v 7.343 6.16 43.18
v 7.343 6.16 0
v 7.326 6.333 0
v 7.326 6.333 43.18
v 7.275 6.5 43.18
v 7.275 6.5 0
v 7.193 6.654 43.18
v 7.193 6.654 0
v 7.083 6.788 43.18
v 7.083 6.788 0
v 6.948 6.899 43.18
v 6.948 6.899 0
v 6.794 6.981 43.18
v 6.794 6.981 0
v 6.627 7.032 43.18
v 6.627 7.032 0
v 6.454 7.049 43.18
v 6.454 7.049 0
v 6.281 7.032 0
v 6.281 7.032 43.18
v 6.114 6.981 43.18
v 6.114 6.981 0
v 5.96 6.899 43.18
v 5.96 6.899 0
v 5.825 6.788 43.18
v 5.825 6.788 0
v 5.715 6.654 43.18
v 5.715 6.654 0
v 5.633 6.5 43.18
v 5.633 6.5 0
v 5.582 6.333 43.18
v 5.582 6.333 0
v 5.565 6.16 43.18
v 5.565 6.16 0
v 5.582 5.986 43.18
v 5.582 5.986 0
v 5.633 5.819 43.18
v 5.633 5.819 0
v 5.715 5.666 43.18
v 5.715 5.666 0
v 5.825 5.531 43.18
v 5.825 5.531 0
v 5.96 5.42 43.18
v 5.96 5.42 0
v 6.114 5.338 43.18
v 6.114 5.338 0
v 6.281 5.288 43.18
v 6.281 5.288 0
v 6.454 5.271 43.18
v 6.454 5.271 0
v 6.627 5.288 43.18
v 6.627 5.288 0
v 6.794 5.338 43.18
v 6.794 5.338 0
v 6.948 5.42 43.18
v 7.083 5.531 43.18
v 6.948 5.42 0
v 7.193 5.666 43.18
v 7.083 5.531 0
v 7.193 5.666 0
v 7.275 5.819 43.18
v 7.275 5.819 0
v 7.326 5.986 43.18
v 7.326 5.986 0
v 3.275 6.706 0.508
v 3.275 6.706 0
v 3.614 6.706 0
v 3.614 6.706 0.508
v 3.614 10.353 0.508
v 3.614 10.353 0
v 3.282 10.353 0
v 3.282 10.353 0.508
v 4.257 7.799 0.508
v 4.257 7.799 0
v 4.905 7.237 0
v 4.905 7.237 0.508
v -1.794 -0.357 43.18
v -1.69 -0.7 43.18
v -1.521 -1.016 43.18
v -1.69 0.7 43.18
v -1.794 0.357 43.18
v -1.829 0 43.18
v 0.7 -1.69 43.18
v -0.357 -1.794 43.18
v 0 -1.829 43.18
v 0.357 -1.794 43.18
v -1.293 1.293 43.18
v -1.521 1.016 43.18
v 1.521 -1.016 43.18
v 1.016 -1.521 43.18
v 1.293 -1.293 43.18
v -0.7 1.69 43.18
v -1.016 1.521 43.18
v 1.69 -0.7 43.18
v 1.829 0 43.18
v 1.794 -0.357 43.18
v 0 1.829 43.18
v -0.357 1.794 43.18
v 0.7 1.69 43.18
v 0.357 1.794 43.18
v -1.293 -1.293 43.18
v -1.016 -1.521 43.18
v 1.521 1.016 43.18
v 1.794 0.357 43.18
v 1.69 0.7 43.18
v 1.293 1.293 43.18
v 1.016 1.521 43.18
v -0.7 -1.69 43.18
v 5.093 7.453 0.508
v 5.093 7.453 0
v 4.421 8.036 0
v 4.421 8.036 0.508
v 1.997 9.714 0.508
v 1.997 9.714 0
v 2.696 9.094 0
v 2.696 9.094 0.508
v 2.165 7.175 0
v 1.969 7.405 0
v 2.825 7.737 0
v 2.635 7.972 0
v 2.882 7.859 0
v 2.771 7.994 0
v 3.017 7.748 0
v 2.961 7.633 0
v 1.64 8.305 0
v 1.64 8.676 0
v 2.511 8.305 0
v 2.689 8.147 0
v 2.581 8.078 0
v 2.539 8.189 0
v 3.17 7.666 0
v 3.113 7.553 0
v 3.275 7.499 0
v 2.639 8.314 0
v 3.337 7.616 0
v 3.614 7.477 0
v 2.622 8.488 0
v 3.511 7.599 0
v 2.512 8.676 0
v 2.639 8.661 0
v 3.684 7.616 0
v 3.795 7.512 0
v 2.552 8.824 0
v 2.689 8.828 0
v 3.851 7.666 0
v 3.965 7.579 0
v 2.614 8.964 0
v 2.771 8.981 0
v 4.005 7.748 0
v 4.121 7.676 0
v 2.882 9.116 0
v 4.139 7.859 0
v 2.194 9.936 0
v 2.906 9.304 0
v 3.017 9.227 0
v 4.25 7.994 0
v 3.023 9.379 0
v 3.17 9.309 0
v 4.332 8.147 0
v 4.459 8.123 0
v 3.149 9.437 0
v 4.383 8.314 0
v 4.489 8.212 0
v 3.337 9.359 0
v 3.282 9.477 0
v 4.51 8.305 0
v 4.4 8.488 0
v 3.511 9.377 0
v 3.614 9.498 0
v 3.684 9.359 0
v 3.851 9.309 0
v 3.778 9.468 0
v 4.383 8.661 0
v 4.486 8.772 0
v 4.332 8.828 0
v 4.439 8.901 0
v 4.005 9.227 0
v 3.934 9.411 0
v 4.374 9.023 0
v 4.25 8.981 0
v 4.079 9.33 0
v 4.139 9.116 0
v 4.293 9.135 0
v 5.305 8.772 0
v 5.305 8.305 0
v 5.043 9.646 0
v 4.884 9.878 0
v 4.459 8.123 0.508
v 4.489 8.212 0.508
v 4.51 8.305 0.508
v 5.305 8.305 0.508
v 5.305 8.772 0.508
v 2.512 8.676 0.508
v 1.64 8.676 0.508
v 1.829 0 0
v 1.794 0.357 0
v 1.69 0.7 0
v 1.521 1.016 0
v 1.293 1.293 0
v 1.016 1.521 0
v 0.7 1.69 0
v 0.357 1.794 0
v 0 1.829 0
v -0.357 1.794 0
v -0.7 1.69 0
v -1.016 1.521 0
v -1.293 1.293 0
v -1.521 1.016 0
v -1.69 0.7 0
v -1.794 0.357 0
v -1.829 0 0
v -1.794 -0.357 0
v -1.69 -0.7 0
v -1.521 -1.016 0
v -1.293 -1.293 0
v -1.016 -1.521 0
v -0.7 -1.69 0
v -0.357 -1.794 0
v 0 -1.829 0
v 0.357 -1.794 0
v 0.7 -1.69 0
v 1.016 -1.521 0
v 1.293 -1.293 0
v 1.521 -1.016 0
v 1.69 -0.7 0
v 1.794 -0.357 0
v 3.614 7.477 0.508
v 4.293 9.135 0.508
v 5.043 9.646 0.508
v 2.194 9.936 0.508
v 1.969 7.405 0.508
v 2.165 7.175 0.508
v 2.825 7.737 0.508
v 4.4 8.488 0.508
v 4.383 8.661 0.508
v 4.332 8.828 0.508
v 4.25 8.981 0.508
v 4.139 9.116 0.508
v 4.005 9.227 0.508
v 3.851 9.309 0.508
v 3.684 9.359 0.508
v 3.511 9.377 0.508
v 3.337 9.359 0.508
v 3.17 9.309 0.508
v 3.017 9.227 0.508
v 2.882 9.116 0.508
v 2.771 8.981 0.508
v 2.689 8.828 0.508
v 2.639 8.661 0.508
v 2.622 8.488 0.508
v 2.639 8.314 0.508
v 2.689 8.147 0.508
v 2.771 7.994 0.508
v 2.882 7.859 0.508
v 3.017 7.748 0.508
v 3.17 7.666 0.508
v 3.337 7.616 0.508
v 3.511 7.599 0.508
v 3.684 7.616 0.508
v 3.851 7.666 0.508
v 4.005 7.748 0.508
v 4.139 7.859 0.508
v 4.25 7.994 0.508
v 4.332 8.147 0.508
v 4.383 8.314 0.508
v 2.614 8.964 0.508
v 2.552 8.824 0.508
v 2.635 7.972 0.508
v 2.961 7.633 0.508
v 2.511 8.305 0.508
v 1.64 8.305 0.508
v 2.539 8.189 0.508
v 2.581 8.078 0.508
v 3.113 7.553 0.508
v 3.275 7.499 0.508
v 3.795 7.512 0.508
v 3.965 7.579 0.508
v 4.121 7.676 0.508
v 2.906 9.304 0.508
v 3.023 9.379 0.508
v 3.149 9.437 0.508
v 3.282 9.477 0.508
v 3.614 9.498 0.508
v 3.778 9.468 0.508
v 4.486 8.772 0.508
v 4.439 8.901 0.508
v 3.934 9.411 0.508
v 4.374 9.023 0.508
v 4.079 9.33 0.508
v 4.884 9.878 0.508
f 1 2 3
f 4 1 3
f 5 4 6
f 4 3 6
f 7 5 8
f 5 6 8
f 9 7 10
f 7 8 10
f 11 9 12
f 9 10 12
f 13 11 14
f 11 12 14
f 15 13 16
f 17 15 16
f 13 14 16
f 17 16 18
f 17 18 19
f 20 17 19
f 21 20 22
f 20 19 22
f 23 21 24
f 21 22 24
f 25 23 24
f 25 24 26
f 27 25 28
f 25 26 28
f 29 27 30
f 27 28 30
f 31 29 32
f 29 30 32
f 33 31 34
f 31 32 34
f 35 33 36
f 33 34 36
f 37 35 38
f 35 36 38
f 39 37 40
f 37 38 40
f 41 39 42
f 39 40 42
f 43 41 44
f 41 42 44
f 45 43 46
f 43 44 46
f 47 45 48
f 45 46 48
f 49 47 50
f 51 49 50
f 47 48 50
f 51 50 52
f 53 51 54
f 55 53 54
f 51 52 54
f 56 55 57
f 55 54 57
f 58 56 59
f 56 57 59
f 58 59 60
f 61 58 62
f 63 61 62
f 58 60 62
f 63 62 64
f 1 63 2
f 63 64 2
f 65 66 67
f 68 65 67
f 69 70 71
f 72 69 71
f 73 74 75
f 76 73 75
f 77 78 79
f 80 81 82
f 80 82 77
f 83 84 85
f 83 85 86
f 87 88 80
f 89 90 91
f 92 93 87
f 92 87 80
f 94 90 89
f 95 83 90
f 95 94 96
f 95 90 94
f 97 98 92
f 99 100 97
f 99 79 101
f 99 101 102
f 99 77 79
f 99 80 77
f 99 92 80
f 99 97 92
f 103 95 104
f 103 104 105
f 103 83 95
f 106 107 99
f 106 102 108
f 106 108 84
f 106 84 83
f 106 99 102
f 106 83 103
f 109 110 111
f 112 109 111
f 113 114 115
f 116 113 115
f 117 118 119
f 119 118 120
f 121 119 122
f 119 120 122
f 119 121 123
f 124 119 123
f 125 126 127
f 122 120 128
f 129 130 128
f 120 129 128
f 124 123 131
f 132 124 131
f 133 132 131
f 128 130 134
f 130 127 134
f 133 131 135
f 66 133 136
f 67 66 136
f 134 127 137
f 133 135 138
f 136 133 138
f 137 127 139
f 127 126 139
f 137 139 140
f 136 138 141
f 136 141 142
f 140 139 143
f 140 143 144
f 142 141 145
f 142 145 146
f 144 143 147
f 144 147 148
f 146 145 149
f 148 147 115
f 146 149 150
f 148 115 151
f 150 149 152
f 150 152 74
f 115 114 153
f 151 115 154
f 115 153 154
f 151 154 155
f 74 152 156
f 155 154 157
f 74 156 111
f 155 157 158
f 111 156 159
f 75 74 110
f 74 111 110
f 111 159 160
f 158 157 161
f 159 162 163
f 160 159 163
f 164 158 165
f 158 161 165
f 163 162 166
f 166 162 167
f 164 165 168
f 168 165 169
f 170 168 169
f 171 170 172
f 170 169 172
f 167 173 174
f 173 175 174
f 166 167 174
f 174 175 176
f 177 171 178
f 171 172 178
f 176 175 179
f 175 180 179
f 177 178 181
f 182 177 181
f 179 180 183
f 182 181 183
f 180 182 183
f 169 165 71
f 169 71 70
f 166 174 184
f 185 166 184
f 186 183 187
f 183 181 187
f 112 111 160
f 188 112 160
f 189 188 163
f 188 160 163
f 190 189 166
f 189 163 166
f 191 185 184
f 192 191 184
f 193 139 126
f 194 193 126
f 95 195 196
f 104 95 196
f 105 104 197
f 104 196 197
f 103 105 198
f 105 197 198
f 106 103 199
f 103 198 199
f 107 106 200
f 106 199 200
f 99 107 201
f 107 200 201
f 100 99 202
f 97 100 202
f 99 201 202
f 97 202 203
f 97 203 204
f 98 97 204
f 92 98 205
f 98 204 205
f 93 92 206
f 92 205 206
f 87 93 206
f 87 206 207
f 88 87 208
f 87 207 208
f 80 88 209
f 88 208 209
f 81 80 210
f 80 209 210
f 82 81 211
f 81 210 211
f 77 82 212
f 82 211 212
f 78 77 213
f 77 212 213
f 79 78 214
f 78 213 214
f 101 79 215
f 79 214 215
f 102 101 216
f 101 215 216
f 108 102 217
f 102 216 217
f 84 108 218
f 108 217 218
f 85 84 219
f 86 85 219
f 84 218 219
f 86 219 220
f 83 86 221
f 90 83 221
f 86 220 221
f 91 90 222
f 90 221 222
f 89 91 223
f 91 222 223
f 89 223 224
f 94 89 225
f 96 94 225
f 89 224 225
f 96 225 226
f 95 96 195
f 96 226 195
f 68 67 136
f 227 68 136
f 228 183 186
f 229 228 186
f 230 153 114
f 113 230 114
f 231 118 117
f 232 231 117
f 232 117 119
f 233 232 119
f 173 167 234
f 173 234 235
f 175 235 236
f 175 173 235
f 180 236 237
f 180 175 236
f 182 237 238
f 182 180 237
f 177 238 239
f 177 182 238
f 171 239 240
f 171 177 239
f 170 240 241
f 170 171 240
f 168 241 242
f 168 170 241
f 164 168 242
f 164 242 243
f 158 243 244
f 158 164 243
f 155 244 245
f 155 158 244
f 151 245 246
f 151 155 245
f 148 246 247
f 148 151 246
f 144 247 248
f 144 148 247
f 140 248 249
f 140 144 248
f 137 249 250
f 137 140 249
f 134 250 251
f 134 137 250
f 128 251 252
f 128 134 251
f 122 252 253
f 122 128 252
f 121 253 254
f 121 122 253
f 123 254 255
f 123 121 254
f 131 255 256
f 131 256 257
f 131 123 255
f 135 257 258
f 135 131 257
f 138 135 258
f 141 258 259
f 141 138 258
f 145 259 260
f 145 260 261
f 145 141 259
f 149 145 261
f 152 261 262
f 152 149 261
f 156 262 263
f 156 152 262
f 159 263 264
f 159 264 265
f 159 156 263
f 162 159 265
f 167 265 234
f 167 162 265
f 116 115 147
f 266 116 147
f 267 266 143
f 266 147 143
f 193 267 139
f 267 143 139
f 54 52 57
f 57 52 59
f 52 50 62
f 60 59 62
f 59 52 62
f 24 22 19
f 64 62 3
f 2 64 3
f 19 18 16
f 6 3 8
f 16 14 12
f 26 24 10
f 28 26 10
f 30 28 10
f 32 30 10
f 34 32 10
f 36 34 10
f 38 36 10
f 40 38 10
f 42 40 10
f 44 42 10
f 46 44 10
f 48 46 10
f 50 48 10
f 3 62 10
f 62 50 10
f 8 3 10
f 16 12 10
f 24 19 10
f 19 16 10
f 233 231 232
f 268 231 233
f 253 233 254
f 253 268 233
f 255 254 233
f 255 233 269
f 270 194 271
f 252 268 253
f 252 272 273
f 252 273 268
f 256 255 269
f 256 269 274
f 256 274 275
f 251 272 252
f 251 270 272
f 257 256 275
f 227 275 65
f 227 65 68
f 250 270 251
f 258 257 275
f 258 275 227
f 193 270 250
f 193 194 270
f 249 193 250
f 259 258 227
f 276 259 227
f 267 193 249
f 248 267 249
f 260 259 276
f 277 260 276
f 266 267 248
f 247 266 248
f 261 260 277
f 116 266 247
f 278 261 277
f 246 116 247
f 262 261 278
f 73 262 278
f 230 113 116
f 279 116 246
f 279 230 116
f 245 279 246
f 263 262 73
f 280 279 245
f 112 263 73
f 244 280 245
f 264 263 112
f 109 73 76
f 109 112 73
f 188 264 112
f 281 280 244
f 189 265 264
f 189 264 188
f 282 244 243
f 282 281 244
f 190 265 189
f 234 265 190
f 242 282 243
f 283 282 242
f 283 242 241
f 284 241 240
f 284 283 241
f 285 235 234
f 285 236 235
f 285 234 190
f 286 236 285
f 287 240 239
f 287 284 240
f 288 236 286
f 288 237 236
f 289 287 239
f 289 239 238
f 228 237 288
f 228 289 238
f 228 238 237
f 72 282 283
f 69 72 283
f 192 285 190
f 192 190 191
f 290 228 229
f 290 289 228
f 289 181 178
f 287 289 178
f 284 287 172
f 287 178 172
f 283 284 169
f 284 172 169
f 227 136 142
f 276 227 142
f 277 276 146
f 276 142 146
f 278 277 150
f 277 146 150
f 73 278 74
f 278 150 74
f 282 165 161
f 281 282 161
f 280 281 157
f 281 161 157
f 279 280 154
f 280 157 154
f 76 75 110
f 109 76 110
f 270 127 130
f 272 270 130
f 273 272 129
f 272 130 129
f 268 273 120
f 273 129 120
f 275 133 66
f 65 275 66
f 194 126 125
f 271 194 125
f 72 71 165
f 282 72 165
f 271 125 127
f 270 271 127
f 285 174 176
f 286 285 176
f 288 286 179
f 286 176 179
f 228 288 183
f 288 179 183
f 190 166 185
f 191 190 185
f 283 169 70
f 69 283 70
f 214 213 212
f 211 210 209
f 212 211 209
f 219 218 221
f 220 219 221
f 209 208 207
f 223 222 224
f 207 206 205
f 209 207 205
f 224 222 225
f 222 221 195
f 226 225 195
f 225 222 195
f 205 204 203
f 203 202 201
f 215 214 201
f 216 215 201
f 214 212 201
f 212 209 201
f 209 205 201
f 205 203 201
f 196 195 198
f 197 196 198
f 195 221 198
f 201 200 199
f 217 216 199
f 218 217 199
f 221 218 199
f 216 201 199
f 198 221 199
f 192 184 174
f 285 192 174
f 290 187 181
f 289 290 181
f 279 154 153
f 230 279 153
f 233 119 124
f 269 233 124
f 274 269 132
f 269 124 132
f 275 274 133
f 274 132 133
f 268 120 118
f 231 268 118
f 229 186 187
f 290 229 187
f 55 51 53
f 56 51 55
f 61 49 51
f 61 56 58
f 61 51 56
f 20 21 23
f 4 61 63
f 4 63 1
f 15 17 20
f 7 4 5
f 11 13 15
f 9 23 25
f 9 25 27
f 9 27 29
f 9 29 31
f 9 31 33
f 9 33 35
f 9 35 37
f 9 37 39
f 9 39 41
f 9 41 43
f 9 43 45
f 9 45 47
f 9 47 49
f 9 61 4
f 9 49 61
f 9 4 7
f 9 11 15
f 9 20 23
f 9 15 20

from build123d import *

# Parameters (mm, degrees)
F0_R     = 1.8288
F1_DEPTH = 43.18
F0_R_2   = 0.889
F2_DEPTH = 43.18
F3_DEPTH = 0.508


with BuildPart() as f1:
    # F0 (on Top) → F1 (new body)
    with BuildSketch(Plane.XY):
        Circle(F0_R)
    extrude(amount=F1_DEPTH)


with BuildPart() as f2:
    # F0 (on Top) → F2 (new body)
    with BuildSketch(Plane.XY):
        with Locations((6.454015, 6.159626)):
            Circle(F0_R_2)
    extrude(amount=F2_DEPTH)


with BuildPart() as f3:
    # F0 (on Top) → F3 (new body)
    with BuildSketch(Plane.XY):
        with BuildLine():
            ThreePointArc((4.510042, 8.304527), (4.522503, 8.395676), (4.526668, 8.487578))
            ThreePointArc((4.526668, 8.487578), (4.516479, 8.631108), (4.486115, 8.771759))
            ThreePointArc((4.486115, 8.771759), (4.408371, 8.963377), (4.293439, 9.135285))
            ThreePointArc((4.293439, 9.135285), (4.193136, 9.240235), (4.078899, 9.329819))
            ThreePointArc((4.078899, 9.329819), (3.857038, 9.442713), (3.614385, 9.49827))
            ThreePointArc((3.614385, 9.49827), (3.4472, 9.501593), (3.281734, 9.477449))
            ThreePointArc((3.281734, 9.477449), (3.085133, 9.410169), (2.906331, 9.304298))
            ThreePointArc((2.906331, 9.304298), (2.793215, 9.206965), (2.695578, 9.094112))
            ThreePointArc((2.695578, 9.094112), (2.580118, 8.895416), (2.512265, 8.675854))
            ThreePointArc((2.512265, 8.675854), (2.494672, 8.490235), (2.511294, 8.304527))
            ThreePointArc((2.511294, 8.304527), (2.558561, 8.132968), (2.635035, 7.972288))
            ThreePointArc((2.635035, 7.972288), (2.721459, 7.84773), (2.825455, 7.737418))
            ThreePointArc((2.825455, 7.737418), (3.035282, 7.589655), (3.27544, 7.499183))
            ThreePointArc((3.27544, 7.499183), (3.443974, 7.473769), (3.614385, 7.476885))
            ThreePointArc((3.614385, 7.476885), (3.965358, 7.579), (4.257478, 7.798716))
            ThreePointArc((4.257478, 7.798716), (4.347686, 7.911682), (4.420949, 8.036307))
            ThreePointArc((4.420949, 8.036307), (4.474868, 8.167304), (4.510042, 8.304527))
        make_face()
        with Locations((3.510668, 8.487578)):
            Circle(F0_R_2, mode=Mode.SUBTRACT)
        with BuildLine():
            ThreePointArc((3.281734, 9.477449), (3.4472, 9.501593), (3.614385, 9.49827))
            Line((3.614385, 9.49827), (3.614385, 10.352937))
            Line((3.614385, 10.352937), (3.281734, 10.352937))
            Line((3.281734, 10.352937), (3.281734, 9.477449))
        make_face()
        with BuildLine():
            ThreePointArc((2.695578, 9.094112), (2.793215, 9.206965), (2.906331, 9.304298))
            Line((2.906331, 9.304298), (2.194438, 9.936489))
            Line((2.194438, 9.936489), (1.997158, 9.714338))
            Line((1.997158, 9.714338), (2.695578, 9.094112))
        make_face()
        with BuildLine():
            ThreePointArc((4.078899, 9.329819), (4.193136, 9.240235), (4.293439, 9.135285))
            Line((4.293439, 9.135285), (5.042599, 9.645747))
            Line((5.042599, 9.645747), (4.884052, 9.878433))
            Line((4.884052, 9.878433), (4.078899, 9.329819))
        make_face()
        with BuildLine():
            ThreePointArc((4.486115, 8.771759), (4.516479, 8.631108), (4.526668, 8.487578))
            ThreePointArc((4.526668, 8.487578), (4.522503, 8.395676), (4.510042, 8.304527))
            Line((4.510042, 8.304527), (5.304877, 8.304527))
            Line((5.304877, 8.304527), (5.304877, 8.771759))
            Line((5.304877, 8.771759), (4.486115, 8.771759))
        make_face()
        with BuildLine():
            Line((5.093221, 7.45324), (4.420949, 8.036307))
            ThreePointArc((4.420949, 8.036307), (4.347686, 7.911682), (4.257478, 7.798716))
            Line((4.257478, 7.798716), (4.905443, 7.236732))
            Line((4.905443, 7.236732), (5.093221, 7.45324))
        make_face()
        with BuildLine():
            Line((3.614385, 6.706009), (3.614385, 7.476885))
            ThreePointArc((3.614385, 7.476885), (3.443974, 7.473769), (3.27544, 7.499183))
            Line((3.27544, 7.499183), (3.27544, 6.706009))
            Line((3.27544, 6.706009), (3.614385, 6.706009))
        make_face()
        with BuildLine():
            ThreePointArc((2.511294, 8.304527), (2.494672, 8.490235), (2.512265, 8.675854))
            Line((2.512265, 8.675854), (1.639693, 8.675854))
            Line((1.639693, 8.675854), (1.639693, 8.304527))
            Line((1.639693, 8.304527), (2.511294, 8.304527))
        make_face()
        with BuildLine():
            Line((2.164812, 7.174852), (2.825455, 7.737418))
            ThreePointArc((2.825455, 7.737418), (2.721459, 7.84773), (2.635035, 7.972288))
            Line((2.635035, 7.972288), (1.968838, 7.404992))
            Line((1.968838, 7.404992), (2.164812, 7.174852))
        make_face()
    extrude(amount=F3_DEPTH)


solid = Compound([f1.part, f2.part, f3.part])
